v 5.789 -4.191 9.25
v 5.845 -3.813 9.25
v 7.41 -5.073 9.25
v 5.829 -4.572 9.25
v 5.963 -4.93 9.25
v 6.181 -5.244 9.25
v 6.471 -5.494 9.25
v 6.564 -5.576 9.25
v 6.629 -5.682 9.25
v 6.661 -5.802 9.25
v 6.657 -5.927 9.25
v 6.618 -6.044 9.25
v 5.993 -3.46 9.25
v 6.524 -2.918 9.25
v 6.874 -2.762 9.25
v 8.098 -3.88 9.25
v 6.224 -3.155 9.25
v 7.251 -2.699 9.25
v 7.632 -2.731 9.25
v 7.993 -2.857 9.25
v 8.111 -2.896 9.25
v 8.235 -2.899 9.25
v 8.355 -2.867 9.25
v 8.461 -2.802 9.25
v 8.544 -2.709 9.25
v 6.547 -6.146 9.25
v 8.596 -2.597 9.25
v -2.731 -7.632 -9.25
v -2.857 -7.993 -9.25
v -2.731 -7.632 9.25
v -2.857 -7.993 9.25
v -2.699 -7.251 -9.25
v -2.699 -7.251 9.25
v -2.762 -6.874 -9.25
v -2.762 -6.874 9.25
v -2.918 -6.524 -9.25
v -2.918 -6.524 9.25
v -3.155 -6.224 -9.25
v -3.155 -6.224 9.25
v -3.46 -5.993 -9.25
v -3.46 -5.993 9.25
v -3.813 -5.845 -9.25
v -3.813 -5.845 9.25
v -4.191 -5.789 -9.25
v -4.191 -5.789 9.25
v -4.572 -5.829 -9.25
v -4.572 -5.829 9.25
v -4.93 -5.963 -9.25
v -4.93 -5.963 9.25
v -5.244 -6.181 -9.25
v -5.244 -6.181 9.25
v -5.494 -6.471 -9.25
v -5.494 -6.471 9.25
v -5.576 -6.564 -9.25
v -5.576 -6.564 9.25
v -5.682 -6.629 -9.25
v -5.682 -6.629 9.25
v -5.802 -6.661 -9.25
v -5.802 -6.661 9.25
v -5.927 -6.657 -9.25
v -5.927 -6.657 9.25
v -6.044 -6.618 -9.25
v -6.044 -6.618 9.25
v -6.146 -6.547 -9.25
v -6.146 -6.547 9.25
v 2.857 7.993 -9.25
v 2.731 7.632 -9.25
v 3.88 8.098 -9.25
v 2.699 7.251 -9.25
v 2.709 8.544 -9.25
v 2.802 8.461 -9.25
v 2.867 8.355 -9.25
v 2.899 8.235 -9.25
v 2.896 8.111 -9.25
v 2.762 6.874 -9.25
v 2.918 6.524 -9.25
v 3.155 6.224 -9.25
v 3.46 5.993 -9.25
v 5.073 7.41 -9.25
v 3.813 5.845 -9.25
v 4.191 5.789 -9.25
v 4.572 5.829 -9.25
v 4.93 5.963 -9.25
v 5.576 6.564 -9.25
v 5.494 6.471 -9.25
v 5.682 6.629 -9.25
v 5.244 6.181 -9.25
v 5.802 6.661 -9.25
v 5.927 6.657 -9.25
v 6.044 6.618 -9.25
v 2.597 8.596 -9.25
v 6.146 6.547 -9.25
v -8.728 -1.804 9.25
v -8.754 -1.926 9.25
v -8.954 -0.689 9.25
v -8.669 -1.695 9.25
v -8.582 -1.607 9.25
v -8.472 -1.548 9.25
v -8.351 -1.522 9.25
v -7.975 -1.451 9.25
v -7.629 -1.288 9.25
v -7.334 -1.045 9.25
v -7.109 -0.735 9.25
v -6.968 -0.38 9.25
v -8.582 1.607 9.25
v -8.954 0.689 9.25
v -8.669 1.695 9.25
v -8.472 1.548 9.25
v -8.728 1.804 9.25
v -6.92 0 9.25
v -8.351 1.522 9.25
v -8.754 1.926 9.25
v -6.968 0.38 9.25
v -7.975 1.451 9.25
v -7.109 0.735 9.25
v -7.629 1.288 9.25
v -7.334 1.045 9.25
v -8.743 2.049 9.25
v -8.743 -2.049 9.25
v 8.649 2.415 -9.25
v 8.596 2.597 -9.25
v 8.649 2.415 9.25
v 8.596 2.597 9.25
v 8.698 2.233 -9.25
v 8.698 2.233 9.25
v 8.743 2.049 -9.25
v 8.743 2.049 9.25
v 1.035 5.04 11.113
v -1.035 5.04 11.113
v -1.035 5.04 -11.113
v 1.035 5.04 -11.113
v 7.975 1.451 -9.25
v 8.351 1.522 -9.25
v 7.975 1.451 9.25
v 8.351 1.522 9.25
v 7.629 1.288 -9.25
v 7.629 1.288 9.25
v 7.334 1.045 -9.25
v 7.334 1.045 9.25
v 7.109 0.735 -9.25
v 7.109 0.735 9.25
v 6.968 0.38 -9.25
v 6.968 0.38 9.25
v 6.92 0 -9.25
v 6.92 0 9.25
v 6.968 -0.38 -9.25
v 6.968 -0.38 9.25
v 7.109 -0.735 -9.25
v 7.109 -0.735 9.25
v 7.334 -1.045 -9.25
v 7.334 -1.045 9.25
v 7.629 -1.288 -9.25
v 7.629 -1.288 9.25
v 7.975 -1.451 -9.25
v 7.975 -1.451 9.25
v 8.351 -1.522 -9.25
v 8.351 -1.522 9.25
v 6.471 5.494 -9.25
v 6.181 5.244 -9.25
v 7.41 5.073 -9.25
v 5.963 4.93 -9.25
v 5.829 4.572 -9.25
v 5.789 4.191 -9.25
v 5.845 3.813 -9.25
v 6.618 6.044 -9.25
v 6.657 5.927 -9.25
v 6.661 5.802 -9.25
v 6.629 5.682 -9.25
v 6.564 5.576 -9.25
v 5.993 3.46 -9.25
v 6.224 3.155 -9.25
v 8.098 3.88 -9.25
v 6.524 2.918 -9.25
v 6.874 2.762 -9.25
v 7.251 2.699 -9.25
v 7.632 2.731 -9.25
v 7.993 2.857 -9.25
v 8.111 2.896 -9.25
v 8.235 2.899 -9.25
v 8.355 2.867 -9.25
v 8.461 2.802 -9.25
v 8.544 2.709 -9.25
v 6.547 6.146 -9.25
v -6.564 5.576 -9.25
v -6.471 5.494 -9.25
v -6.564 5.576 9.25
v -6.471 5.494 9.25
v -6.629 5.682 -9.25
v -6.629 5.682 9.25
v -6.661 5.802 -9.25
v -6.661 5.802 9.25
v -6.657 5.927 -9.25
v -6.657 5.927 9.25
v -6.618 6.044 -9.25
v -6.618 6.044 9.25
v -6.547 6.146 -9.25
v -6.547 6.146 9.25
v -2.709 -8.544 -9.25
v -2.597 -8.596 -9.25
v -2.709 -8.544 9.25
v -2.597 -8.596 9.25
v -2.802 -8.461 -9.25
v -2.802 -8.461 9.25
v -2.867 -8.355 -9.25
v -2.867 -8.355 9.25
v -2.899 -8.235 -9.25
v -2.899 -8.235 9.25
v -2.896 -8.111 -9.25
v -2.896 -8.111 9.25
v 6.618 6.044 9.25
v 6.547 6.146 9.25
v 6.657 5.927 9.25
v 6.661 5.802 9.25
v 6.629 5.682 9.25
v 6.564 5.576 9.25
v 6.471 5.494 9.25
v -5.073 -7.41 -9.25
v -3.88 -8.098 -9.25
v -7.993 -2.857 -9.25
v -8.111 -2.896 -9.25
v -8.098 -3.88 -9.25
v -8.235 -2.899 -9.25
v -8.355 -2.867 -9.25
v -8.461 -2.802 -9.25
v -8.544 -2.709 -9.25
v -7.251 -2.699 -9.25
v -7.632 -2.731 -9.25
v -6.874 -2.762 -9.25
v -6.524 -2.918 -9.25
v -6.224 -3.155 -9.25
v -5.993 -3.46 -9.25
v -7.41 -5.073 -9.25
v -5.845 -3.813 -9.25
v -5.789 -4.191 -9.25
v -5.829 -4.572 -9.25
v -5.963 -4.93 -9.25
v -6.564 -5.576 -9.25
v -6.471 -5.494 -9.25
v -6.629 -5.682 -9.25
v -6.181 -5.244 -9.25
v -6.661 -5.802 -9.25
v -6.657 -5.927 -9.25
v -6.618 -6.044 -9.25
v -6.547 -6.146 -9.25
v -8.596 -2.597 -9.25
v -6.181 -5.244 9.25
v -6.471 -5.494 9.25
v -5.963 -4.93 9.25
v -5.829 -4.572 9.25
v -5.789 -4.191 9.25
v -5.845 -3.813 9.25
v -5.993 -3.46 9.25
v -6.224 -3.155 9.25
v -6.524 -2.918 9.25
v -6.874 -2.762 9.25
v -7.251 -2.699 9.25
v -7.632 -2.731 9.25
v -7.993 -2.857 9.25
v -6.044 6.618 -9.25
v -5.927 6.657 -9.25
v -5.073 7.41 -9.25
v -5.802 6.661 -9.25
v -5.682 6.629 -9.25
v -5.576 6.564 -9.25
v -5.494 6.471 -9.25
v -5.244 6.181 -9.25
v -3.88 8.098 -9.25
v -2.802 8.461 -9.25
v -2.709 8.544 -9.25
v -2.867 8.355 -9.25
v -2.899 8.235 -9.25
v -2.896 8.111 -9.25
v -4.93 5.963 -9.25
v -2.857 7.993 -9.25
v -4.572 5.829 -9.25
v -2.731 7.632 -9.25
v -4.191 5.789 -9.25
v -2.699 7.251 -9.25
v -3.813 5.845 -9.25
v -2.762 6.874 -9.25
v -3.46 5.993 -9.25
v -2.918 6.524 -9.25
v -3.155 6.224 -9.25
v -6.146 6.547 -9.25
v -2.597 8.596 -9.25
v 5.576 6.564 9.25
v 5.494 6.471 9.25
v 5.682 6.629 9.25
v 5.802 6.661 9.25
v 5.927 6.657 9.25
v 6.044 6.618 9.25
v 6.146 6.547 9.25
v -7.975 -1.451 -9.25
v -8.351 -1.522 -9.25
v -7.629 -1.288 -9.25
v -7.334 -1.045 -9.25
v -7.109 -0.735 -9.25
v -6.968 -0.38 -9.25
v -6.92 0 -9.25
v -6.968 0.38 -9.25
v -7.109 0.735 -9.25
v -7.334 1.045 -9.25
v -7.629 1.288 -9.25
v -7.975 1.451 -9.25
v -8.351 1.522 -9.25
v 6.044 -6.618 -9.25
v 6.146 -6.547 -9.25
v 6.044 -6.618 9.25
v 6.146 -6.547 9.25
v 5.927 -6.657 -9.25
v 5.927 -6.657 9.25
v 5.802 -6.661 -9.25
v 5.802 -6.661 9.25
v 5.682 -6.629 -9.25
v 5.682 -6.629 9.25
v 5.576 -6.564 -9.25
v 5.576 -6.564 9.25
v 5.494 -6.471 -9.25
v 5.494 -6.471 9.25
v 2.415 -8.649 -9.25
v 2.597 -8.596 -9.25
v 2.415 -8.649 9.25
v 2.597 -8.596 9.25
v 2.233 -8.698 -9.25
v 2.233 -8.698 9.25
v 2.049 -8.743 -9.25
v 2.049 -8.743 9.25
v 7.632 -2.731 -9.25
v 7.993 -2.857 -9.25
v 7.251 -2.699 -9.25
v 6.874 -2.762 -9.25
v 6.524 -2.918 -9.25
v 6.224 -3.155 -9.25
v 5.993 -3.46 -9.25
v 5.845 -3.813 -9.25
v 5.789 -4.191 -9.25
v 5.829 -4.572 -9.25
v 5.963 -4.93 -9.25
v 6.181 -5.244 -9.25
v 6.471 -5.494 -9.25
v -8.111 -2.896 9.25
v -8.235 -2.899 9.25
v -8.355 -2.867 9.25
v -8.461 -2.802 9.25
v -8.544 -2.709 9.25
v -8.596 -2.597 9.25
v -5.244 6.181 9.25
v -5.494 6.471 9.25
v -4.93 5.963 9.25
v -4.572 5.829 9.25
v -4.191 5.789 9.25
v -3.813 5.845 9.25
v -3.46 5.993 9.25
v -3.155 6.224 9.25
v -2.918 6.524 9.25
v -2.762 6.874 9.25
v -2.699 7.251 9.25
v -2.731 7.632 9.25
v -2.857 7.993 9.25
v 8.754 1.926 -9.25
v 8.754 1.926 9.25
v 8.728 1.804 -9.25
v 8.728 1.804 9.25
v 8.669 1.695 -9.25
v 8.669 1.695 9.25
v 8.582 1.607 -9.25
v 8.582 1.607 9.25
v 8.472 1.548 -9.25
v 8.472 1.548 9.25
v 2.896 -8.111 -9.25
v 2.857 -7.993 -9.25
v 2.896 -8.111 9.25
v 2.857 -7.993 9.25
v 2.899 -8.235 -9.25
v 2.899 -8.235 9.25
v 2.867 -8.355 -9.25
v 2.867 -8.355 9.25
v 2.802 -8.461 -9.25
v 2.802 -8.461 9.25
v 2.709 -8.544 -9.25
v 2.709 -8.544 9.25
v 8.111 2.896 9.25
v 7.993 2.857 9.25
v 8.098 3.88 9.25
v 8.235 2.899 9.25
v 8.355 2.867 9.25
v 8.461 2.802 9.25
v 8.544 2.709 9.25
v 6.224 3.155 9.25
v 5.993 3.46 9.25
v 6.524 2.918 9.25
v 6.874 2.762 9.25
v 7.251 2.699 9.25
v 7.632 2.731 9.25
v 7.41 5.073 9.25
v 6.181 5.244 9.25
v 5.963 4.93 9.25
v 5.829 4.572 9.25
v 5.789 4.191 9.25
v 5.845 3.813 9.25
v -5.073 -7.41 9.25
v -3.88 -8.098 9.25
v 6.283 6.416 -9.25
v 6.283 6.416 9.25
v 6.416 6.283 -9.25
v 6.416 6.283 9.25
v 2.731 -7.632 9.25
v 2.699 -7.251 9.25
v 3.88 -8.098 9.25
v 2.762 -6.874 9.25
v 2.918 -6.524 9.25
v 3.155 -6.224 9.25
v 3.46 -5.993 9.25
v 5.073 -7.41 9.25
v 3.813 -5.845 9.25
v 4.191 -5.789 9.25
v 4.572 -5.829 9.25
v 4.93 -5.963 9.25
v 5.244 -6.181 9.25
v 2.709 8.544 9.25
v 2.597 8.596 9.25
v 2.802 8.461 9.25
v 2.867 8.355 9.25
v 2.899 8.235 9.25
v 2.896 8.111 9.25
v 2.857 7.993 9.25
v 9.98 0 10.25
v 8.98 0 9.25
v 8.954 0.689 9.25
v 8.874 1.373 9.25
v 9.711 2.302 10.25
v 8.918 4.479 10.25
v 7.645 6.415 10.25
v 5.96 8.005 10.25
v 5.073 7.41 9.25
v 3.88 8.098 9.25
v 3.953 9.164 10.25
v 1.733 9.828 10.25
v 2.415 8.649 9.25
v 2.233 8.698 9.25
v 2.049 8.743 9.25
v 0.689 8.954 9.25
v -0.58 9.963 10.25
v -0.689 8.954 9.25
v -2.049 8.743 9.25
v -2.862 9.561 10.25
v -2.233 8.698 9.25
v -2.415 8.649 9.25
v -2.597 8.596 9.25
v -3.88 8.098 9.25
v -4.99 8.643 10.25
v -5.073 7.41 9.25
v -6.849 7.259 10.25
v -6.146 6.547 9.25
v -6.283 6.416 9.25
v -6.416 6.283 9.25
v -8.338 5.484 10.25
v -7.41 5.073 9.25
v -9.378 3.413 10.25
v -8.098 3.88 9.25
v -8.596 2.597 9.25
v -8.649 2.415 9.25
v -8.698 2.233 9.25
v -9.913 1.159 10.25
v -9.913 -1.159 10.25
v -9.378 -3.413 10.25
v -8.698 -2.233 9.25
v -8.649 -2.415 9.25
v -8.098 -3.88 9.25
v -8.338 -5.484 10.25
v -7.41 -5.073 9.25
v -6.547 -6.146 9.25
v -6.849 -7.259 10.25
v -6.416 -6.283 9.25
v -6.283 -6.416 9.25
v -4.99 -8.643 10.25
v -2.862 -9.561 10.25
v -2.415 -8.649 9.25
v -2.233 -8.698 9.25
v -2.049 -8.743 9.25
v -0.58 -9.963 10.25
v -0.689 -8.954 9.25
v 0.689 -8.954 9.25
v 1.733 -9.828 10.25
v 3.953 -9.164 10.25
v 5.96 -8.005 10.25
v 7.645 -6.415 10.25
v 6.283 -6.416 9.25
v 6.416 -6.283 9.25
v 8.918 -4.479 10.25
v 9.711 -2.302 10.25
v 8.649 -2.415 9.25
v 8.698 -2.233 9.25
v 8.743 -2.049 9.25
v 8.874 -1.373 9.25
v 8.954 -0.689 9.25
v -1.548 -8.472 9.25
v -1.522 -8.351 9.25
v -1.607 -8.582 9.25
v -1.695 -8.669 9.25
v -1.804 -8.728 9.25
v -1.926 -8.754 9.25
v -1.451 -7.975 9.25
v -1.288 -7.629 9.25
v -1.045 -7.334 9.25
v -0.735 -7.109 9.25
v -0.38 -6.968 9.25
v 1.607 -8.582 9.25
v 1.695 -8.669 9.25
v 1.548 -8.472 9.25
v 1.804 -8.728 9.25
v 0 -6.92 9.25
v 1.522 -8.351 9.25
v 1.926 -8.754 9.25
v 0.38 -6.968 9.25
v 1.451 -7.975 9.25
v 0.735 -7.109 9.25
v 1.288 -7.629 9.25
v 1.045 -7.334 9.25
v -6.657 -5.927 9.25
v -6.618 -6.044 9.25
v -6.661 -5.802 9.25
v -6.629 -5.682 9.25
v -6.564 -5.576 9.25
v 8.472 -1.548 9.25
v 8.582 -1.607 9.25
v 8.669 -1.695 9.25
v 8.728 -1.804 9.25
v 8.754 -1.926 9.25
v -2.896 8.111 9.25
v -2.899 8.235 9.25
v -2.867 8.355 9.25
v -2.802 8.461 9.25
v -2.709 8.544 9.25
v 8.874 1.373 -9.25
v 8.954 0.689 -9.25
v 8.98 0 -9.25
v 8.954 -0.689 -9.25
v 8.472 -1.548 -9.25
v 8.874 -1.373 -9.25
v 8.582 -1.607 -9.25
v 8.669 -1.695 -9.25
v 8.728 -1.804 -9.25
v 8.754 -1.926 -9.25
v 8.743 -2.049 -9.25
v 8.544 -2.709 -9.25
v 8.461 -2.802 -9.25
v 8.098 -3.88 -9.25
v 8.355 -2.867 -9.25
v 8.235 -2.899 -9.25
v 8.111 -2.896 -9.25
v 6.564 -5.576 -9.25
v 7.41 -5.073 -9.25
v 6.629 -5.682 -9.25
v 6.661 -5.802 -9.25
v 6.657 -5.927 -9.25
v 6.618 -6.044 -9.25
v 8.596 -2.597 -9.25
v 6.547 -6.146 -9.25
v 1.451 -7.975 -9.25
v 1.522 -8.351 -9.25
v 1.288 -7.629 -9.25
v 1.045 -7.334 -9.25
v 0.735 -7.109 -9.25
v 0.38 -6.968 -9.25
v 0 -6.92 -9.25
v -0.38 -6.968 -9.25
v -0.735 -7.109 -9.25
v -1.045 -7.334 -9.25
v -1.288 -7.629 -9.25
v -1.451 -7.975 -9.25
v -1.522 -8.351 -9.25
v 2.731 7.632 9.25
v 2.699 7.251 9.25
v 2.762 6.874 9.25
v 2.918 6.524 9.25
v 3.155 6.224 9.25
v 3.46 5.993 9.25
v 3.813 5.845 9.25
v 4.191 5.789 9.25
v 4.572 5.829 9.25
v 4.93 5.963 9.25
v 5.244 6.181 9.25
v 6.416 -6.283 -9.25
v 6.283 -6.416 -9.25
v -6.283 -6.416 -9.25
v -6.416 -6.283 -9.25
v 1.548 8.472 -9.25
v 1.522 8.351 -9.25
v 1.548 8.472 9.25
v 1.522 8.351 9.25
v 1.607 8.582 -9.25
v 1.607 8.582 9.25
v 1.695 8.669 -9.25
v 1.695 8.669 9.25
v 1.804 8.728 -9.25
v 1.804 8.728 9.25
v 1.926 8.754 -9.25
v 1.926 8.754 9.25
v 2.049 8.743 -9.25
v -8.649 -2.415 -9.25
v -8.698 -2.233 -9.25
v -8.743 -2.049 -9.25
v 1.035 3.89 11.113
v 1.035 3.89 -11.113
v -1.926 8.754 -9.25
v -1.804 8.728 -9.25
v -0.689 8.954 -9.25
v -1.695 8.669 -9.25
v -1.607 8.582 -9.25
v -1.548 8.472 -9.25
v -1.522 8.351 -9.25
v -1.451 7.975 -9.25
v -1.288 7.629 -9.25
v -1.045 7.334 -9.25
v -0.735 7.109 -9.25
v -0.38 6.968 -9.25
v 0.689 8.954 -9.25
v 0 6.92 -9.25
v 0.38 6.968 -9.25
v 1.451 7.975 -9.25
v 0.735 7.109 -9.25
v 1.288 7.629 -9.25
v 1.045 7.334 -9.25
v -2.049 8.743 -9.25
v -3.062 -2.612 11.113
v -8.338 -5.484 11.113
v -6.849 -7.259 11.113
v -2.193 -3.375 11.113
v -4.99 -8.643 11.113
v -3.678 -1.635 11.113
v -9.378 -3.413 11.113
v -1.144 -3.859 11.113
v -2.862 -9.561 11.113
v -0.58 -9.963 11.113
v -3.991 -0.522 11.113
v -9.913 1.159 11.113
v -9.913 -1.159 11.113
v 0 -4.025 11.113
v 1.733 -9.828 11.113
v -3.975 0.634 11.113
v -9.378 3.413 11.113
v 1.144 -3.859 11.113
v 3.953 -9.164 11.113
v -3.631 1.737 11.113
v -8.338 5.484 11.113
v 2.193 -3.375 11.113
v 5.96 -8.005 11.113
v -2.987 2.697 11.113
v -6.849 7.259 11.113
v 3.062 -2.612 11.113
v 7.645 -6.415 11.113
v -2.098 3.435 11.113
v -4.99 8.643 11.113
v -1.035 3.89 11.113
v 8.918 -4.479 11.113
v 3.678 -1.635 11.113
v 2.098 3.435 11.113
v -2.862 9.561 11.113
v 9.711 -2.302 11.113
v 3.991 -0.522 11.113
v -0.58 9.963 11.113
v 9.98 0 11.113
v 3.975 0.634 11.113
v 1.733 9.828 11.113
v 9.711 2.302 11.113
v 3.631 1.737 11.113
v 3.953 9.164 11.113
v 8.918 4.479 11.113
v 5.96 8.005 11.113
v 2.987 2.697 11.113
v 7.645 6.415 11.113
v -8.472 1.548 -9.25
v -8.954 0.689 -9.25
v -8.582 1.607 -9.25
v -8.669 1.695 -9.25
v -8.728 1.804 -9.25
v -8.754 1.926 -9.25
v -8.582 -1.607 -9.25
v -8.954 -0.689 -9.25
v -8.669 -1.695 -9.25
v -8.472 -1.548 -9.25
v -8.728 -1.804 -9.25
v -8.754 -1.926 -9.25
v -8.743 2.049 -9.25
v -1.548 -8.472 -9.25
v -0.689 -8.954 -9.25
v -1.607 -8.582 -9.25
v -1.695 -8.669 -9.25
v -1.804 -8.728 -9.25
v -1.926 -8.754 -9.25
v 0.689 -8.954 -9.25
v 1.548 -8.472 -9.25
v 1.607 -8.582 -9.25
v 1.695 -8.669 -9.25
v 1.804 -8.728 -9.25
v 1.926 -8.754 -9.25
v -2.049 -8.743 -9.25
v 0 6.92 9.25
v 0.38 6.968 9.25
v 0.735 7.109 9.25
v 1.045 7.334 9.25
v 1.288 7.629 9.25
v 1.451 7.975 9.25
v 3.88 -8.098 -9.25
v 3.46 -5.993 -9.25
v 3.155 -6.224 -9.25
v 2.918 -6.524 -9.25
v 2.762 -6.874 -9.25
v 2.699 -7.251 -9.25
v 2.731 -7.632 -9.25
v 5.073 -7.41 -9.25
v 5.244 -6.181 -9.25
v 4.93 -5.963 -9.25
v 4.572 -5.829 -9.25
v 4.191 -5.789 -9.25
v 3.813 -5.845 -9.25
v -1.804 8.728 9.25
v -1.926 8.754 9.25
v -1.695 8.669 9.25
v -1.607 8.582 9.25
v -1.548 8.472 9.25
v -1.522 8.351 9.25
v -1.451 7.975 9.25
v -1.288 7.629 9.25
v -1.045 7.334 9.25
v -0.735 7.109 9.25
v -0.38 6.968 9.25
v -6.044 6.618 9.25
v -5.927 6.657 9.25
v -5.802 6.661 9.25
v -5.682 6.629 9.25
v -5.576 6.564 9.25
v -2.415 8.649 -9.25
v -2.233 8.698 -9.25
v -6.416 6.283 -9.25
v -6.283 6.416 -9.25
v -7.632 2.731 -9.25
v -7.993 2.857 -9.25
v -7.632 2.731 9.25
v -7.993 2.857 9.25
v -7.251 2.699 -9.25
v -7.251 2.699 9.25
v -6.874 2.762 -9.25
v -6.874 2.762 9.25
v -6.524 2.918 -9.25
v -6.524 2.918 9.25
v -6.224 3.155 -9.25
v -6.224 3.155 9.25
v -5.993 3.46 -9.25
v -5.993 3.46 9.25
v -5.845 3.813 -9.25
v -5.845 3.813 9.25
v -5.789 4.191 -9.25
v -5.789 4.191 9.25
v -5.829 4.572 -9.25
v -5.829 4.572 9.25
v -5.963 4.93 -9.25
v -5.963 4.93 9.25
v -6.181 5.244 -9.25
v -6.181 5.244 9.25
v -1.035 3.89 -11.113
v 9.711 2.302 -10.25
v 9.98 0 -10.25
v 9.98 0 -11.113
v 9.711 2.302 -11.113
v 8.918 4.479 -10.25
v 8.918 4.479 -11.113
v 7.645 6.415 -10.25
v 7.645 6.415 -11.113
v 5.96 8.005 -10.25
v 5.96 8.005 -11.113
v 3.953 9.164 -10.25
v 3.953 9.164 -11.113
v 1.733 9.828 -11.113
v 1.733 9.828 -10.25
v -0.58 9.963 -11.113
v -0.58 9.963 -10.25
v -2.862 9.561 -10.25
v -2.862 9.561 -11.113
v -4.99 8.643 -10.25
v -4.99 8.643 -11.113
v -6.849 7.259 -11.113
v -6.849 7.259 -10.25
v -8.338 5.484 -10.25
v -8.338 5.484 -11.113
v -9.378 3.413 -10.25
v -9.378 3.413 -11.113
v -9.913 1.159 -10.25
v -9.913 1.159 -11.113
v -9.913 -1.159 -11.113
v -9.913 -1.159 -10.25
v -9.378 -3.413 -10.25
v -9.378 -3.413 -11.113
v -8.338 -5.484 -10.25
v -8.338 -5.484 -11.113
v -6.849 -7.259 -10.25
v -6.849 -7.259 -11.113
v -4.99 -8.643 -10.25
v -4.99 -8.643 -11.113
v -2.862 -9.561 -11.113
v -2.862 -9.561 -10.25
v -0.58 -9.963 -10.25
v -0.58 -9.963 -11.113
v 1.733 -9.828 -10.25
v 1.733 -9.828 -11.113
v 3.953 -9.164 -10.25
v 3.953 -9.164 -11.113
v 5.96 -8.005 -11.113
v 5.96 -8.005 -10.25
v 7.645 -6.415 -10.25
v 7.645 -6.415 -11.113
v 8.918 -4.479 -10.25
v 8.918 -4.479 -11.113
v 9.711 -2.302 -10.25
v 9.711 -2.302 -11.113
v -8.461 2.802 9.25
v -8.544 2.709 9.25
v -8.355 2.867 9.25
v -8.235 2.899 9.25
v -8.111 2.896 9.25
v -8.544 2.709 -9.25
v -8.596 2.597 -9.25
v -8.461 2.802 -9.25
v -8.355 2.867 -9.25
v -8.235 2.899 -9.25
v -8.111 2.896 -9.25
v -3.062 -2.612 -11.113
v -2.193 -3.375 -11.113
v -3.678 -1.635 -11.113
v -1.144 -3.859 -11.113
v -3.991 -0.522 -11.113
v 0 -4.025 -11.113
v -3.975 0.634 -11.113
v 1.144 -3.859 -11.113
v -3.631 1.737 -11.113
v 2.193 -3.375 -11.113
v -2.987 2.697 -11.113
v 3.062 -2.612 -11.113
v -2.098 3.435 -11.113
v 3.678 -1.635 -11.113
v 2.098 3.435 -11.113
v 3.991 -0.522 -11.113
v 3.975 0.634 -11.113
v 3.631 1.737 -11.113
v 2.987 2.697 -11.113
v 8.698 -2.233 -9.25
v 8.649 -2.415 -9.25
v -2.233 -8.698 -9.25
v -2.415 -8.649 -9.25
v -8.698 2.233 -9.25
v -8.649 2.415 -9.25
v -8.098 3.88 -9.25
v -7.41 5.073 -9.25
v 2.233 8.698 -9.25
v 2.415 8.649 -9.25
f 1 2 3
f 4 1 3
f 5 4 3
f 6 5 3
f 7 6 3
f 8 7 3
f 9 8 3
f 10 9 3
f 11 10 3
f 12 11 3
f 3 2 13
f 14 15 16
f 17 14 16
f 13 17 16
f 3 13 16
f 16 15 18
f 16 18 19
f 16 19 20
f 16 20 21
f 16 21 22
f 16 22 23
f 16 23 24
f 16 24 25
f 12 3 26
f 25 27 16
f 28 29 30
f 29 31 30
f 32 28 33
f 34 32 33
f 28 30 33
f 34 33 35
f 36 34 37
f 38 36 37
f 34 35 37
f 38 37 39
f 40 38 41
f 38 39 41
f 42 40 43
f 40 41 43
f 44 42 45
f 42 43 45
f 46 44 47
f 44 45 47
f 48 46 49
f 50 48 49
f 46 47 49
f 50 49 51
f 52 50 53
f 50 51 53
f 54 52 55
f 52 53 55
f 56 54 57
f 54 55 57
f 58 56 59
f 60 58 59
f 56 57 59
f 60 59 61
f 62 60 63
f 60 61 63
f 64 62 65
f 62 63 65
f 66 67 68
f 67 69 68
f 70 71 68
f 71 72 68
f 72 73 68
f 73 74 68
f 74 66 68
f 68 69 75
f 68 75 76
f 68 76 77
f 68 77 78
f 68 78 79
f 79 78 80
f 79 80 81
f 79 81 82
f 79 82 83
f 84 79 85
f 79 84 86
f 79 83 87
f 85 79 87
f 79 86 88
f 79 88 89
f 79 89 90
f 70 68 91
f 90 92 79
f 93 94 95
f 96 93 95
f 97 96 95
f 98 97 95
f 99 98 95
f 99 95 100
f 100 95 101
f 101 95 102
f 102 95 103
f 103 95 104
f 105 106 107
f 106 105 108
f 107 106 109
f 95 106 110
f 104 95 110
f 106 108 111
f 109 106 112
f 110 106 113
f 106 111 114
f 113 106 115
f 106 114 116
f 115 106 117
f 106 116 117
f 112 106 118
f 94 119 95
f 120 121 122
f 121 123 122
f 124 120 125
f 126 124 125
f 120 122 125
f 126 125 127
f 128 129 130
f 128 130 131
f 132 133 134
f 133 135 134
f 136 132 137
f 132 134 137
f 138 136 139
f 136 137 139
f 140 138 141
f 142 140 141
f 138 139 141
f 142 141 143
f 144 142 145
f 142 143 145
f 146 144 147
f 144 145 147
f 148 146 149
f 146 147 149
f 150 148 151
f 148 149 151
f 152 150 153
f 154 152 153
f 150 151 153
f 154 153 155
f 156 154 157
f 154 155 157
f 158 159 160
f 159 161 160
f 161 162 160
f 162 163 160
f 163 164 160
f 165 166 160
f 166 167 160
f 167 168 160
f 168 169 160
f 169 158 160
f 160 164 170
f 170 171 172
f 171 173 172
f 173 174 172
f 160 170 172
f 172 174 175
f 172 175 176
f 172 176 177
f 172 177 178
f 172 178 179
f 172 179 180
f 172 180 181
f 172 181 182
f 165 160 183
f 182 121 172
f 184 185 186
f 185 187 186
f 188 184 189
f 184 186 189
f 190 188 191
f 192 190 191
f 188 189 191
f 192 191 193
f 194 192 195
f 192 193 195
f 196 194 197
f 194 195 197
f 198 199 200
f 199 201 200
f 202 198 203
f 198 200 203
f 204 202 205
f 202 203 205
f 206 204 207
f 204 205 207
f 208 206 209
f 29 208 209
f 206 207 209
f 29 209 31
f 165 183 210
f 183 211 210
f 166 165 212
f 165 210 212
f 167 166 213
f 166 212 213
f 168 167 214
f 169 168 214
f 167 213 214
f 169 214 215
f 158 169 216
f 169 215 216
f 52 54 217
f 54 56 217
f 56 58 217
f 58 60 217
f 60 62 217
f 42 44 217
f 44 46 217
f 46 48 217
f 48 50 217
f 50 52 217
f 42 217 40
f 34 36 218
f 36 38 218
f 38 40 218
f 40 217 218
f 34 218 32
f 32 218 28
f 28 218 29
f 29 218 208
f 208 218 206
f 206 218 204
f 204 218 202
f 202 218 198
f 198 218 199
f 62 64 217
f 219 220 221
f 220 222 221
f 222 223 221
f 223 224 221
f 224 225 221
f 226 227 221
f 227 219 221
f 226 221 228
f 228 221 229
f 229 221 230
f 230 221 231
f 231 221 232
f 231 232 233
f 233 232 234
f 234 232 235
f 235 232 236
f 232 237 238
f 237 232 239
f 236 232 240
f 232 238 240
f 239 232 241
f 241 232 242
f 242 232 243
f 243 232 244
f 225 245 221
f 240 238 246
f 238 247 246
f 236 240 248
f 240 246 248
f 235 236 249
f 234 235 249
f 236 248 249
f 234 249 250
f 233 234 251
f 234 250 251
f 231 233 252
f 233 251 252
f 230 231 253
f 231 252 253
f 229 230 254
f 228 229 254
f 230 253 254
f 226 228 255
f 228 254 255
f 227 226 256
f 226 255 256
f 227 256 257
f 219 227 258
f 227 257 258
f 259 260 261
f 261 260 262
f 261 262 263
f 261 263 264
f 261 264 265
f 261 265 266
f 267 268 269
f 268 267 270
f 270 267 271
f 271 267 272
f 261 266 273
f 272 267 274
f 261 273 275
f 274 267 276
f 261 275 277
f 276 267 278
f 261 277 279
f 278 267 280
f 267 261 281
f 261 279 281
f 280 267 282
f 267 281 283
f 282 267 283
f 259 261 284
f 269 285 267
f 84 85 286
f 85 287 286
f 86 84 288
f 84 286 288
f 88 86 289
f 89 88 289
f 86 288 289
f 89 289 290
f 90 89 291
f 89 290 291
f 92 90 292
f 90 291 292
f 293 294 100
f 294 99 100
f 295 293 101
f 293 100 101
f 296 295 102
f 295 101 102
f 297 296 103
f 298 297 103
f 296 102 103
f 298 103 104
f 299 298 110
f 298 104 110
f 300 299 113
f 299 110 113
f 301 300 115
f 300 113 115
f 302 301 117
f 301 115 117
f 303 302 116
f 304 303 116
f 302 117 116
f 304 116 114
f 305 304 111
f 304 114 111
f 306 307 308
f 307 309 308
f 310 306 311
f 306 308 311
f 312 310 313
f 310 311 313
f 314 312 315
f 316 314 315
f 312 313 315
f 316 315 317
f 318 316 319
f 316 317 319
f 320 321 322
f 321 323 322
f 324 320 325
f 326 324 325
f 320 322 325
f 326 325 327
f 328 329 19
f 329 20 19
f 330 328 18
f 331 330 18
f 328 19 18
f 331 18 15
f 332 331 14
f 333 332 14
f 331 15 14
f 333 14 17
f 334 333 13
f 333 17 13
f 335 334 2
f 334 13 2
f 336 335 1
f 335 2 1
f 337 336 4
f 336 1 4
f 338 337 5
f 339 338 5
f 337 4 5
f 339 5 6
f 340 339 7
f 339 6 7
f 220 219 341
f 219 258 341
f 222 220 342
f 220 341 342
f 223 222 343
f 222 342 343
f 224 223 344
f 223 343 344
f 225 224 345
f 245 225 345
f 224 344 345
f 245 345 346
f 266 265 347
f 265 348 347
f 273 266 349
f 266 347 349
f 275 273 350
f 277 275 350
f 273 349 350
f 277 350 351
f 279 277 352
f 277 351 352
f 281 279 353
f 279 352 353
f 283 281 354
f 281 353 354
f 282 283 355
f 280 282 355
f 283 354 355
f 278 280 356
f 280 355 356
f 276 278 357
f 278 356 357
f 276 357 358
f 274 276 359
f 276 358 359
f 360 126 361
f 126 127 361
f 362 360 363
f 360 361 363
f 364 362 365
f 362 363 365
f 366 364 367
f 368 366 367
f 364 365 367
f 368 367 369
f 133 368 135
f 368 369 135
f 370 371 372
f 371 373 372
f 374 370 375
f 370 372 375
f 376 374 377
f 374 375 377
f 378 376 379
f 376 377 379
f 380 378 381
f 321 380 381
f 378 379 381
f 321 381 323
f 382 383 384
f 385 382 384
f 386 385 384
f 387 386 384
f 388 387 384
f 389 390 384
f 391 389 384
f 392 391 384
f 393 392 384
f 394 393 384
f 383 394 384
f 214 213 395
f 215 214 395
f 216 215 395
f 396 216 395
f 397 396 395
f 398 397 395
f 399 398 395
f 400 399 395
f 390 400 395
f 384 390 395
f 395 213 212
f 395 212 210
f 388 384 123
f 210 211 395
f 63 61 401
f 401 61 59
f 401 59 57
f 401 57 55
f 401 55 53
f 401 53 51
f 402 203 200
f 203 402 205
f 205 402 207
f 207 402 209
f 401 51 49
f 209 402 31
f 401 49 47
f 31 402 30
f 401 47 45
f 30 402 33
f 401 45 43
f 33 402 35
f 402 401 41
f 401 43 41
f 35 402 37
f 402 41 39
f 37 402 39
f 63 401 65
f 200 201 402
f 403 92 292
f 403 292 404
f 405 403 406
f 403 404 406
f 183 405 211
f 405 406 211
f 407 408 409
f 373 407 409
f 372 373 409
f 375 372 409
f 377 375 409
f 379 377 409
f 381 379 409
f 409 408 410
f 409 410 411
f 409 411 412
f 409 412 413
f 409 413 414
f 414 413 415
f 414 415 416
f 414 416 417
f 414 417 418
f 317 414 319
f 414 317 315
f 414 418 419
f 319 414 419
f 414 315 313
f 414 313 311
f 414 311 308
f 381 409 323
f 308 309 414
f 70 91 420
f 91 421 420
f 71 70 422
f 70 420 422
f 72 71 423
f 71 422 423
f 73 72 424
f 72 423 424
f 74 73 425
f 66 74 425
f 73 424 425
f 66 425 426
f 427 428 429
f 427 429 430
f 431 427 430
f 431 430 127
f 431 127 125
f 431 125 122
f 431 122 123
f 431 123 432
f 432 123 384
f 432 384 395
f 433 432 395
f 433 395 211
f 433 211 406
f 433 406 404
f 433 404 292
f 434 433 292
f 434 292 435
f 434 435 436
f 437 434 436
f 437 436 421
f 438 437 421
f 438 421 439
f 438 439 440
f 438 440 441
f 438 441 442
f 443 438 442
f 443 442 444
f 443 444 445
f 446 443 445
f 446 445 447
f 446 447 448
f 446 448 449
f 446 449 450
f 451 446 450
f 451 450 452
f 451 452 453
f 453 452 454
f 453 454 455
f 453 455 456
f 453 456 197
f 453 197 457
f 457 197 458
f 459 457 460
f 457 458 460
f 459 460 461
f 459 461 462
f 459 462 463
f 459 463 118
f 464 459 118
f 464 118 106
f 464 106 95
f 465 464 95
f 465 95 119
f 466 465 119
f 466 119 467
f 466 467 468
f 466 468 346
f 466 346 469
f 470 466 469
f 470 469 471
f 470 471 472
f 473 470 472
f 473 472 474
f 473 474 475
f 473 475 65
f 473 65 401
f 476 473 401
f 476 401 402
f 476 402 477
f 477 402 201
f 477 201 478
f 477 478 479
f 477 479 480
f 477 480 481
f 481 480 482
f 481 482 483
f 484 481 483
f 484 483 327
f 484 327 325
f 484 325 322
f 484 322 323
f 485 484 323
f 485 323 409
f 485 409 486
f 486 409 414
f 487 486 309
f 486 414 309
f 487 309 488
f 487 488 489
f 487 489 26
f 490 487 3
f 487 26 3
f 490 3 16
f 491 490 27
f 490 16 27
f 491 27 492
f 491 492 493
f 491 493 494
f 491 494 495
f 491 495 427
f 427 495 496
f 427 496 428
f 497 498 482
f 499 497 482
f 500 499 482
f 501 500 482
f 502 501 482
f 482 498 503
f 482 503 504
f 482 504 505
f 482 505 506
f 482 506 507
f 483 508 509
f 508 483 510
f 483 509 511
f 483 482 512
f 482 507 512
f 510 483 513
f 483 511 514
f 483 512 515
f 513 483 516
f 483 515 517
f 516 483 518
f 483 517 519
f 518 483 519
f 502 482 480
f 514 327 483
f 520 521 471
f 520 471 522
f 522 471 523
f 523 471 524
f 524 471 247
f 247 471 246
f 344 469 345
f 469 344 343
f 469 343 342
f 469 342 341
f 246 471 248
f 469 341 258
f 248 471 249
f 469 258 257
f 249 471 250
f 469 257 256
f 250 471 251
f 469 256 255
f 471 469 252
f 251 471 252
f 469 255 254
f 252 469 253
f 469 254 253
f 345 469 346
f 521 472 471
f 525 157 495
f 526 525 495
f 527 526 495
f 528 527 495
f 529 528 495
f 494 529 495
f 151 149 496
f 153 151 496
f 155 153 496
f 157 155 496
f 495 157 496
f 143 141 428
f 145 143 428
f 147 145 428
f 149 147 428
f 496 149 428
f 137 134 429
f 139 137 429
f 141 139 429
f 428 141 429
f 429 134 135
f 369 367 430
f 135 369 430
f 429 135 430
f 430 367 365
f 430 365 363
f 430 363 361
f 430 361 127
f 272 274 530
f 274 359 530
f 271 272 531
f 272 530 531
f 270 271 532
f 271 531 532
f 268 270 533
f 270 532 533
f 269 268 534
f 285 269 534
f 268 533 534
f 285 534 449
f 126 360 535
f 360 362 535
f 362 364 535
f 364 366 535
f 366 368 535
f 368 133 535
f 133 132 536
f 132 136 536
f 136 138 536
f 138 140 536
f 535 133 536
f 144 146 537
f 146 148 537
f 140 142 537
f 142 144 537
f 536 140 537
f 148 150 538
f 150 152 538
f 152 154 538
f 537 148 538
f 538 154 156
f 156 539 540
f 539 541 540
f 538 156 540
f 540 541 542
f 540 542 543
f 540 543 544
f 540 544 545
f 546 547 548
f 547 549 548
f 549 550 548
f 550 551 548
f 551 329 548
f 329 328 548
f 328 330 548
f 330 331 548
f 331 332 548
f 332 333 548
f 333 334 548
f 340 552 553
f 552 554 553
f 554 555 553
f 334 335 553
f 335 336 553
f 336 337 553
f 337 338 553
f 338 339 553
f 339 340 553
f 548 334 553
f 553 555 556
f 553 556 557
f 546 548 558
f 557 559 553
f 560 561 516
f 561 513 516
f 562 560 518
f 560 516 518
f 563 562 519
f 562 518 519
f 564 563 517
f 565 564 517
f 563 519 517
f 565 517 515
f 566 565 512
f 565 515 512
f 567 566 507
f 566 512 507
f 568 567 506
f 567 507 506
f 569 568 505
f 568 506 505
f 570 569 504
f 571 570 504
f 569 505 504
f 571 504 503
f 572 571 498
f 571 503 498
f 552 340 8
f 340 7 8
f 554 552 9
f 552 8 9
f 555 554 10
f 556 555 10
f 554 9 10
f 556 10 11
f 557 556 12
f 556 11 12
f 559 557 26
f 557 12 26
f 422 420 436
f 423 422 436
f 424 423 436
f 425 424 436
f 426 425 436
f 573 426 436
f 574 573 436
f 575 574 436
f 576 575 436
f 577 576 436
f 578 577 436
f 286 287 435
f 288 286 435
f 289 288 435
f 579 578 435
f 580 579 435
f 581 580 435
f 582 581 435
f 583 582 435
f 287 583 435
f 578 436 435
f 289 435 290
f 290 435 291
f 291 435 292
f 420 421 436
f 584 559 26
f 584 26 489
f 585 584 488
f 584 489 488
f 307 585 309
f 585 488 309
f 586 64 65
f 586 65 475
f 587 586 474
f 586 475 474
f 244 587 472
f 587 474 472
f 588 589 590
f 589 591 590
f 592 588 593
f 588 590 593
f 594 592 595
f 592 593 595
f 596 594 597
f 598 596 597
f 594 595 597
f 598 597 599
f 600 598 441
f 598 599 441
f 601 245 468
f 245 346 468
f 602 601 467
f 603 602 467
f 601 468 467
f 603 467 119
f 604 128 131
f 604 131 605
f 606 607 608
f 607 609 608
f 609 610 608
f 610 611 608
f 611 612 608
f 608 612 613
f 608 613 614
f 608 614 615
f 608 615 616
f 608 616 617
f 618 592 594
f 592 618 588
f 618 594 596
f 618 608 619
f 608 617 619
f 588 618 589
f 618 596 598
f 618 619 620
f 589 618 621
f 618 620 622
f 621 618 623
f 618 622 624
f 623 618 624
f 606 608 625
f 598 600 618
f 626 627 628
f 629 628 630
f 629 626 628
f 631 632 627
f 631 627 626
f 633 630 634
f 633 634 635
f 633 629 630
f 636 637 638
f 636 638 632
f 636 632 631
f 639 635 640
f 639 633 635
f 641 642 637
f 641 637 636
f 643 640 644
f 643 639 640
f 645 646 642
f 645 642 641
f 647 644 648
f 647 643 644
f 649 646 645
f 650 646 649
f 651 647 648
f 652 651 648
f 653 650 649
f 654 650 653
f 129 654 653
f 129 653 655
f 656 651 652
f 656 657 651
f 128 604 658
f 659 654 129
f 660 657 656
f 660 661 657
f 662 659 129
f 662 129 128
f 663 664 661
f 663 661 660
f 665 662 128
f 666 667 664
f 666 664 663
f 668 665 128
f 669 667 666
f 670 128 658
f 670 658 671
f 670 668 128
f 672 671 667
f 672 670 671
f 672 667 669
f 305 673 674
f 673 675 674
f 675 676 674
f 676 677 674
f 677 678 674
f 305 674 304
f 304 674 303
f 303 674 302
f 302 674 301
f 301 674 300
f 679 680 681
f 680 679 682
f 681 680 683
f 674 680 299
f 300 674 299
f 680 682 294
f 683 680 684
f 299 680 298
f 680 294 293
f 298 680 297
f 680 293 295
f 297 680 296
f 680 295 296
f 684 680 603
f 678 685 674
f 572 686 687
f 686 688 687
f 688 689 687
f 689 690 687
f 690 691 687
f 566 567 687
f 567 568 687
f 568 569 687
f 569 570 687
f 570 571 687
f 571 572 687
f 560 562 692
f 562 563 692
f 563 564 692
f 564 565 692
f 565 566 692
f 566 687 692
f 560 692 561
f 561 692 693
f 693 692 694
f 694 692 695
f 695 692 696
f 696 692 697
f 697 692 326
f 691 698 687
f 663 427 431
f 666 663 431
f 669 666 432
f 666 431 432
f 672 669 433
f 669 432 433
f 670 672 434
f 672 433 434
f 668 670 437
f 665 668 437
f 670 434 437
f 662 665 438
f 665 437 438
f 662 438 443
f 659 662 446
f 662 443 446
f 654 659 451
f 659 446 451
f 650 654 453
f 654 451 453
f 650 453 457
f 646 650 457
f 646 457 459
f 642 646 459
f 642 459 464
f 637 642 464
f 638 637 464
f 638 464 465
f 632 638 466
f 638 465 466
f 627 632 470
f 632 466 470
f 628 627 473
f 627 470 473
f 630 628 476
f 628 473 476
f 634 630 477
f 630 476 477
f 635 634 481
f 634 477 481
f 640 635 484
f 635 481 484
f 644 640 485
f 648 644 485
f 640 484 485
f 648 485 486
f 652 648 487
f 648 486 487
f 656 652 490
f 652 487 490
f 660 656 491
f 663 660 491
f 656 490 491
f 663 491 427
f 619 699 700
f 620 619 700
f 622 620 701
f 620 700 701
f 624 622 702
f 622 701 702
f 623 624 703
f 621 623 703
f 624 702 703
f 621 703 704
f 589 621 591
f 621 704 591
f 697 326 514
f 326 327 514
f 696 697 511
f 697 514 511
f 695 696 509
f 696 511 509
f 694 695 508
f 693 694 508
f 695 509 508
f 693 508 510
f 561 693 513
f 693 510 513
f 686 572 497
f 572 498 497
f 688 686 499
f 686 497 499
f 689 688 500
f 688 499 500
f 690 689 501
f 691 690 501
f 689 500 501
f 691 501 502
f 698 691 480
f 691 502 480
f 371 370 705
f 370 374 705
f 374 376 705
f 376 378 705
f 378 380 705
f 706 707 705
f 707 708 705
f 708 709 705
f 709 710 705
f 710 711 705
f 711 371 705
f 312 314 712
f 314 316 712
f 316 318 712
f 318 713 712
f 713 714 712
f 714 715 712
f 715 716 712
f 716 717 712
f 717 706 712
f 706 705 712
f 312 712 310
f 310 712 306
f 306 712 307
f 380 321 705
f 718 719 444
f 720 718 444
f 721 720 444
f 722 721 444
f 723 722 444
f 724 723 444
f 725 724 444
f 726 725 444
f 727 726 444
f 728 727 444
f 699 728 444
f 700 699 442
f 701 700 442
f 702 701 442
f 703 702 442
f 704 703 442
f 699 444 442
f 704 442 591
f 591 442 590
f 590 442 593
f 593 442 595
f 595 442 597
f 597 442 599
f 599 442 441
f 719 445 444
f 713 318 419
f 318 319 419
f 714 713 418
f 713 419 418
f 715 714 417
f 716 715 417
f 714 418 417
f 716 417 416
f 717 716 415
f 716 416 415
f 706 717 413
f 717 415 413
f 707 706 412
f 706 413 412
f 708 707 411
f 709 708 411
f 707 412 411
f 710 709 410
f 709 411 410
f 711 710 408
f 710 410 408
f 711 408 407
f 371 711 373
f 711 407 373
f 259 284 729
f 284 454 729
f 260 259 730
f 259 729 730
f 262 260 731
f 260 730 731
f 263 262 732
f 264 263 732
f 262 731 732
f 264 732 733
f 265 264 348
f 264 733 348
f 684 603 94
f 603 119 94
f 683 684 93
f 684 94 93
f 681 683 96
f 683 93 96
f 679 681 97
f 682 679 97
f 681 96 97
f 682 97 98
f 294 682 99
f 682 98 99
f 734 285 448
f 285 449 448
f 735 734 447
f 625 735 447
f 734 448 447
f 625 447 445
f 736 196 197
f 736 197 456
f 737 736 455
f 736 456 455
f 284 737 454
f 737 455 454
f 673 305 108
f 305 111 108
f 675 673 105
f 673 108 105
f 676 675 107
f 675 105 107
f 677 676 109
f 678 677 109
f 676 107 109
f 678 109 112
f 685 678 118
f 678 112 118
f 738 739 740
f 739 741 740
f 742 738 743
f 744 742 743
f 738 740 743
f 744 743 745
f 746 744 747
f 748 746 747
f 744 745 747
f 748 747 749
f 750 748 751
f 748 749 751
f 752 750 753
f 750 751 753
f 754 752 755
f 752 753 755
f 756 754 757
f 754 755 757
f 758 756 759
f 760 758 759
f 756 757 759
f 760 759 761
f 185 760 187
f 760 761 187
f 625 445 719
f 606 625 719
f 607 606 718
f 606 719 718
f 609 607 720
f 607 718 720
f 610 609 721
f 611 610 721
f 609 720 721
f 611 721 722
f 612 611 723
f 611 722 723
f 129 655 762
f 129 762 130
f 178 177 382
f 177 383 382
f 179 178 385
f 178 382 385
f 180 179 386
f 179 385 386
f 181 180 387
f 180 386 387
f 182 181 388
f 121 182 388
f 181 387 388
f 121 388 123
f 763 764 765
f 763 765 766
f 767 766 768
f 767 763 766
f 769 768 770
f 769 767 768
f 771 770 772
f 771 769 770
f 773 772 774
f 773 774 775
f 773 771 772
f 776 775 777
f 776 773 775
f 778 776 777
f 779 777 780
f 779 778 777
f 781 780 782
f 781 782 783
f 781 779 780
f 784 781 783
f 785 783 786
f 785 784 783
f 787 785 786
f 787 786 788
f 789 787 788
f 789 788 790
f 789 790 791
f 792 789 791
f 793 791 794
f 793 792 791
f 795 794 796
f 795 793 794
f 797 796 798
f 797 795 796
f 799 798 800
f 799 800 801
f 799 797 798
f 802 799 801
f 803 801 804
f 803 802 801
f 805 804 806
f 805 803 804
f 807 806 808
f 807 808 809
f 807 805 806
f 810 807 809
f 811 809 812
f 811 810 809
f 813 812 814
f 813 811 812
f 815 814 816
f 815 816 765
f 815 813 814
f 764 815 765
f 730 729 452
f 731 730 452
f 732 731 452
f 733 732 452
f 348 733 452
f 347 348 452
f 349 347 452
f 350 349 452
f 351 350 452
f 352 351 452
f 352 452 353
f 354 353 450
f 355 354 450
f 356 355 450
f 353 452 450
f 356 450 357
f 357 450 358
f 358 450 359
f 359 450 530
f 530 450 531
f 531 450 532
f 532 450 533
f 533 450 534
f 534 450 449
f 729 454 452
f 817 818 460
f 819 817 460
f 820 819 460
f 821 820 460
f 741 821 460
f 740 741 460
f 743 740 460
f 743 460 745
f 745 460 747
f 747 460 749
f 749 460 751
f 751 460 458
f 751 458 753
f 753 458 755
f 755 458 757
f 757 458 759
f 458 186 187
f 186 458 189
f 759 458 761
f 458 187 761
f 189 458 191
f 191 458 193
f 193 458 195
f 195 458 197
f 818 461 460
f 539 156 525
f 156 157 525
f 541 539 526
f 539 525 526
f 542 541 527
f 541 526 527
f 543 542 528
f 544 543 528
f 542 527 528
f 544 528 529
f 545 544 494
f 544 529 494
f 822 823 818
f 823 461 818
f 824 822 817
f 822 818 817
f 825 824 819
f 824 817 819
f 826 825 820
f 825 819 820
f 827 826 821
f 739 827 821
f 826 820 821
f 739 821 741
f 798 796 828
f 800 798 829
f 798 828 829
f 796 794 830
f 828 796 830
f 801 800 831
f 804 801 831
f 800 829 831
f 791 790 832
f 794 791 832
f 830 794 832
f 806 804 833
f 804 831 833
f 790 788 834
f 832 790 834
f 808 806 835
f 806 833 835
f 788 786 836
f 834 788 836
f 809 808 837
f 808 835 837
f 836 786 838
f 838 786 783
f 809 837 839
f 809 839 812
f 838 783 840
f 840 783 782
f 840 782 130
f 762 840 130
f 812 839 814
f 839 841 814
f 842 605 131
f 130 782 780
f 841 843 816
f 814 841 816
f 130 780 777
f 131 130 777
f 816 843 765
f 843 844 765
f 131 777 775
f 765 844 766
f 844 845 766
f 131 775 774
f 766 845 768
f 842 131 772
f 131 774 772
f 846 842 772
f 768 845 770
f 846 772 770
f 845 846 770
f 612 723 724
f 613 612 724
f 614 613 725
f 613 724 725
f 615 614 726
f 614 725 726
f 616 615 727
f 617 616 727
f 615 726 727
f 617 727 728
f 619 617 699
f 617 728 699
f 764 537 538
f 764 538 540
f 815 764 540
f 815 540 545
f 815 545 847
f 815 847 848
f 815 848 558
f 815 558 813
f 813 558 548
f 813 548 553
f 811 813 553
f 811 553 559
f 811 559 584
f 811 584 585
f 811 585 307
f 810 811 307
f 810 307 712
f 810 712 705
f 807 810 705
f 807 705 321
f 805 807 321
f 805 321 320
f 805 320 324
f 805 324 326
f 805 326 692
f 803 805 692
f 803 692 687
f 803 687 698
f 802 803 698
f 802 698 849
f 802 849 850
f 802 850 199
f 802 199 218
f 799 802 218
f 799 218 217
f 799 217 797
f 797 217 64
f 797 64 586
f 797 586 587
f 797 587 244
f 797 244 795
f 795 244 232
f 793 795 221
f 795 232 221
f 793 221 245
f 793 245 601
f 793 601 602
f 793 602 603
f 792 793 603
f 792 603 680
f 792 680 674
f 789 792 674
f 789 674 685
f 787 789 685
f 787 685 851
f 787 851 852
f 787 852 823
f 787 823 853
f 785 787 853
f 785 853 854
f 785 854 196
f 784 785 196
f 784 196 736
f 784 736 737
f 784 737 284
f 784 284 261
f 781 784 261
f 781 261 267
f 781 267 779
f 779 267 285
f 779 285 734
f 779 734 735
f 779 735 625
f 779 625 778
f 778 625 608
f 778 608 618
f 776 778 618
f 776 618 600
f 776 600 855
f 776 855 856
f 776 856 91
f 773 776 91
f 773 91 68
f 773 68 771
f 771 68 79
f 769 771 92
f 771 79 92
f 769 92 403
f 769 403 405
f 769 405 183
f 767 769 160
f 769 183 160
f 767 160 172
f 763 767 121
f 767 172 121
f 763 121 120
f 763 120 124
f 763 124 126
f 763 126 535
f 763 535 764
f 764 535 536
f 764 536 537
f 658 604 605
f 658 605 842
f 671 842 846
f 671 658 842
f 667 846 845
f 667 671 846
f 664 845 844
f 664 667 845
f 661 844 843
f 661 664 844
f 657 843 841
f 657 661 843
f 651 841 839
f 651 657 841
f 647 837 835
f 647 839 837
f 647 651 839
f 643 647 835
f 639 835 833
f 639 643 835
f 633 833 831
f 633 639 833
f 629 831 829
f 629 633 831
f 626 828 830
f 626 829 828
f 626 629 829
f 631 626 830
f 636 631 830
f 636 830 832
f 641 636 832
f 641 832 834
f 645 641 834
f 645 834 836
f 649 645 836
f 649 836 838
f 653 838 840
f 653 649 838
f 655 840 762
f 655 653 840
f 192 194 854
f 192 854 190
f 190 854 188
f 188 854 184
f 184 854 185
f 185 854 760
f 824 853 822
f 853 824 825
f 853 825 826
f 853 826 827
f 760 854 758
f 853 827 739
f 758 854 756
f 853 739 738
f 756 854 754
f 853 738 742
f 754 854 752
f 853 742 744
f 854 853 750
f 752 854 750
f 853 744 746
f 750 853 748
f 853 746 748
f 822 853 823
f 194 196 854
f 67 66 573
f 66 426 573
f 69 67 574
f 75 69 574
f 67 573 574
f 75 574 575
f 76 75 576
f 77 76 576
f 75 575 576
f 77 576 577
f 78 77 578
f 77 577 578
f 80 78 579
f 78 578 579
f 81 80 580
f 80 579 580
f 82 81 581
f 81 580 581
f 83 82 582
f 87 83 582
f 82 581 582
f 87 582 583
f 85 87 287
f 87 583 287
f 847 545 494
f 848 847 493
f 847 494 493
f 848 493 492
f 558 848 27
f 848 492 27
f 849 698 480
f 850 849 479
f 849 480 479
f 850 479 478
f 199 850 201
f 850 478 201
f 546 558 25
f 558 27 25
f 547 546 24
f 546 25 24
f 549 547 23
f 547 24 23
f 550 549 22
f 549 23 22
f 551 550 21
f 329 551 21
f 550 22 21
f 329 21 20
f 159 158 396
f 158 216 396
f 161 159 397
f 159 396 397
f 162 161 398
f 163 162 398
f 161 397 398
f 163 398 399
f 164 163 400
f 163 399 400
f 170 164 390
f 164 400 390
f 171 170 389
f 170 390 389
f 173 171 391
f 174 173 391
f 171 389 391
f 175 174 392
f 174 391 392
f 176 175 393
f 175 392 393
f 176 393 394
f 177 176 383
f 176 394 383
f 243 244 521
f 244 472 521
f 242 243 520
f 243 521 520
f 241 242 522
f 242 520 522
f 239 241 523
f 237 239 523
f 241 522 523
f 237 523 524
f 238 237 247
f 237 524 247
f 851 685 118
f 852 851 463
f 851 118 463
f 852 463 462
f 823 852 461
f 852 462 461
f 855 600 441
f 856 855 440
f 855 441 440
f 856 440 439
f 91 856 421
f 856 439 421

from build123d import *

# Parameters (mm, degrees)
SALIENTE_EXTRUIR1_DEPTH   = 9.25
CROQUIS5_R                = 8.98
SALIENTE_EXTRUIR2_DEPTH   = 1
SALIENTE_EXTRUIR2_DRAFT   = -45
CROQUIS8_R                = 9.98
SALIENTE_EXTRUIR3_DEPTH   = 0.86250003
SIMETR_A1_COPY_1_SKETCH_R = 8.98
SIMETR_A1_COPY_1_DEPTH    = 1
SIMETR_A1_COPY_1_DRAFT    = -45
CORTAR_EXTRUIR1_DEPTH     = 27.327769136


with BuildPart() as part:
    # Croquis3 → Saliente-Extruir1 (new, symmetric)
    with BuildSketch(Plane.XY):
        with BuildLine():
            ThreePointArc((0, 6.92), (1.044537818, 7.333889859), (1.522093853, 8.350897382))
            ThreePointArc((1.522093853, 8.350897382), (1.69468698, 8.669418435), (2.049408684, 8.74301573))
            ThreePointArc((2.049408684, 8.74301573), (2.324195025, 8.67401392), (2.596667882, 8.596378069))
            ThreePointArc((2.596667882, 8.596378069), (2.867067241, 8.355280091), (2.857276747, 7.993136203))
            ThreePointArc((2.857276747, 7.993136203), (2.762348644, 6.873603835), (3.46, 5.992895794))
            ThreePointArc((3.46, 5.992895794), (4.571541215, 5.829066017), (5.493620634, 6.47104235))
            ThreePointArc((5.493620634, 6.47104235), (5.802351194, 6.660593111), (6.146347848, 6.546969386))
            ThreePointArc((6.146347848, 6.546969386), (6.349818895, 6.349818895), (6.546969386, 6.146347848))
            ThreePointArc((6.546969386, 6.146347848), (6.660593111, 5.802351194), (6.47104235, 5.493620634))
            ThreePointArc((6.47104235, 5.493620634), (5.829066017, 4.571541215), (5.992895794, 3.46))
            ThreePointArc((5.992895794, 3.46), (6.873603835, 2.762348644), (7.993136203, 2.857276747))
            ThreePointArc((7.993136203, 2.857276747), (8.355280091, 2.867067241), (8.596378069, 2.596667882))
            ThreePointArc((8.596378069, 2.596667882), (8.67401392, 2.324195025), (8.74301573, 2.049408684))
            ThreePointArc((8.74301573, 2.049408684), (8.669418435, 1.69468698), (8.350897382, 1.522093853))
            ThreePointArc((8.350897382, 1.522093853), (7.333889859, 1.044537818), (6.92, 0))
            ThreePointArc((6.92, 0), (7.333889859, -1.044537818), (8.350897382, -1.522093853))
            ThreePointArc((8.350897382, -1.522093853), (8.669418435, -1.69468698), (8.74301573, -2.049408684))
            ThreePointArc((8.74301573, -2.049408684), (8.67401392, -2.324195025), (8.596378069, -2.596667882))
            ThreePointArc((8.596378069, -2.596667882), (8.355280091, -2.867067241), (7.993136203, -2.857276747))
            ThreePointArc((7.993136203, -2.857276747), (6.873603835, -2.762348644), (5.992895794, -3.46))
            ThreePointArc((5.992895794, -3.46), (5.829066017, -4.571541215), (6.47104235, -5.493620634))
            ThreePointArc((6.47104235, -5.493620634), (6.660593111, -5.802351194), (6.546969386, -6.146347848))
            ThreePointArc((6.546969386, -6.146347848), (6.349818895, -6.349818895), (6.146347848, -6.546969386))
            ThreePointArc((6.146347848, -6.546969386), (5.802351194, -6.660593111), (5.493620634, -6.47104235))
            ThreePointArc((5.493620634, -6.47104235), (4.571541215, -5.829066017), (3.46, -5.992895794))
            ThreePointArc((3.46, -5.992895794), (2.762348644, -6.873603835), (2.857276747, -7.993136203))
            ThreePointArc((2.857276747, -7.993136203), (2.867067241, -8.355280091), (2.596667882, -8.596378069))
            ThreePointArc((2.596667882, -8.596378069), (2.324195025, -8.67401392), (2.049408684, -8.74301573))
            ThreePointArc((2.049408684, -8.74301573), (1.69468698, -8.669418435), (1.522093853, -8.350897382))
            ThreePointArc((1.522093853, -8.350897382), (1.044537818, -7.333889859), (0, -6.92))
            ThreePointArc((0, -6.92), (-1.044537818, -7.333889859), (-1.522093853, -8.350897382))
            ThreePointArc((-1.522093853, -8.350897382), (-1.69468698, -8.669418435), (-2.049408684, -8.74301573))
            ThreePointArc((-2.049408684, -8.74301573), (-2.324195025, -8.67401392), (-2.596667882, -8.596378069))
            ThreePointArc((-2.596667882, -8.596378069), (-2.867067241, -8.355280091), (-2.857276747, -7.993136203))
            ThreePointArc((-2.857276747, -7.993136203), (-2.762348644, -6.873603835), (-3.46, -5.992895794))
            ThreePointArc((-3.46, -5.992895794), (-4.571541215, -5.829066017), (-5.493620634, -6.47104235))
            ThreePointArc((-5.493620634, -6.47104235), (-5.802351194, -6.660593111), (-6.146347848, -6.546969386))
            ThreePointArc((-6.146347848, -6.546969386), (-6.349818895, -6.349818895), (-6.546969386, -6.146347848))
            ThreePointArc((-6.546969386, -6.146347848), (-6.660593111, -5.802351194), (-6.47104235, -5.493620634))
            ThreePointArc((-6.47104235, -5.493620634), (-5.829066017, -4.571541215), (-5.992895794, -3.46))
            ThreePointArc((-5.992895794, -3.46), (-6.873603835, -2.762348644), (-7.993136203, -2.857276747))
            ThreePointArc((-7.993136203, -2.857276747), (-8.355280091, -2.867067241), (-8.596378069, -2.596667882))
            ThreePointArc((-8.596378069, -2.596667882), (-8.67401392, -2.324195025), (-8.74301573, -2.049408684))
            ThreePointArc((-8.74301573, -2.049408684), (-8.669418435, -1.69468698), (-8.350897382, -1.522093853))
            ThreePointArc((-8.350897382, -1.522093853), (-7.333889859, -1.044537818), (-6.92, 0))
            ThreePointArc((-6.92, 0), (-7.333889859, 1.044537818), (-8.350897382, 1.522093853))
            ThreePointArc((-8.350897382, 1.522093853), (-8.669418435, 1.69468698), (-8.74301573, 2.049408684))
            ThreePointArc((-8.74301573, 2.049408684), (-8.67401392, 2.324195025), (-8.596378069, 2.596667882))
            ThreePointArc((-8.596378069, 2.596667882), (-8.355280091, 2.867067241), (-7.993136203, 2.857276747))
            ThreePointArc((-7.993136203, 2.857276747), (-6.873603835, 2.762348644), (-5.992895794, 3.46))
            ThreePointArc((-5.992895794, 3.46), (-5.829066017, 4.571541215), (-6.47104235, 5.493620634))
            ThreePointArc((-6.47104235, 5.493620634), (-6.660593111, 5.802351194), (-6.546969386, 6.146347848))
            ThreePointArc((-6.546969386, 6.146347848), (-6.349818895, 6.349818895), (-6.146347848, 6.546969386))
            ThreePointArc((-6.146347848, 6.546969386), (-5.802351194, 6.660593111), (-5.493620634, 6.47104235))
            ThreePointArc((-5.493620634, 6.47104235), (-4.571541215, 5.829066017), (-3.46, 5.992895794))
            ThreePointArc((-3.46, 5.992895794), (-2.762348644, 6.873603835), (-2.857276747, 7.993136203))
            ThreePointArc((-2.857276747, 7.993136203), (-2.867067241, 8.355280091), (-2.596667882, 8.596378069))
            ThreePointArc((-2.596667882, 8.596378069), (-2.324195025, 8.67401392), (-2.049408684, 8.74301573))
            ThreePointArc((-2.049408684, 8.74301573), (-1.69468698, 8.669418435), (-1.522093853, 8.350897382))
            ThreePointArc((-1.522093853, 8.350897382), (-1.044537818, 7.333889859), (0, 6.92))
        make_face()
    extrude(amount=SALIENTE_EXTRUIR1_DEPTH, both=True)


with BuildPart() as saliente_extruir2_tool:
    # Croquis5 → Saliente-Extruir2 (with draft: the straight prism first)
    with BuildSketch(Plane.XY.offset(9.25)):
        Circle(CROQUIS5_R)
    extrude(amount=SALIENTE_EXTRUIR2_DEPTH)
    # Saliente-Extruir2: the draft: its side faces are tilted about the plane it starts from
    saliente_extruir2_sides = [saliente_extruir2_tool.faces().sort_by_distance(p)[0] for p in [
        (-8.98, 0, 9.75),
    ]]
    draft(saliente_extruir2_sides, Plane.XY.offset(9.25), SALIENTE_EXTRUIR2_DRAFT)


with BuildPart() as part_1:
    add(part.part)

    # Saliente-Extruir2: add saliente_extruir2_tool
    add(saliente_extruir2_tool.part)

    # Croquis8 → Saliente-Extruir3 (add)
    with BuildSketch(Plane.XY.offset(10.25)):
        Circle(CROQUIS8_R)
    saliente_extruir3 = extrude(amount=SALIENTE_EXTRUIR3_DEPTH)


with BuildPart() as simetr_a1_1:
    # Simetría1: Saliente-Extruir3 across plane
    add(saliente_extruir3.mirror(Plane.XY))


with BuildPart() as simetr_a1_copy_1_tool:
    # Simetría1 copy 1 sketch → Simetría1 copy 1 (with draft: the straight prism first)
    with BuildSketch(Plane(origin=(0, 0, -9.25), x_dir=(1, 0, 0), z_dir=(0, 0, -1))):
        Circle(SIMETR_A1_COPY_1_SKETCH_R)
    extrude(amount=SIMETR_A1_COPY_1_DEPTH)
    # Simetría1 copy 1: the draft: its side faces are tilted about the plane it starts from
    simetr_a1_copy_1_sides = [simetr_a1_copy_1_tool.faces().sort_by_distance(p)[0] for p in [
        (-8.98, 0, -9.75),
    ]]
    draft(simetr_a1_copy_1_sides, Plane(origin=(0, 0, -9.25), x_dir=(1, 0, 0), z_dir=(0, 0, -1)), SIMETR_A1_COPY_1_DRAFT)


with BuildPart() as part_2:
    add(part_1.part)

    # Simetría1 copy 1: add simetr_a1_copy_1_tool
    add(simetr_a1_copy_1_tool.part)

    add(simetr_a1_1.part)  # Simetría1 copy 1 merges Simetría1_1

    # Croquis6 → Cortar-Extruir1 (cut, through all)
    with BuildSketch(Plane.XY.offset(11.11250003)):
        with BuildLine():
            Line((-1.035, 3.889652941), (-1.035, 5.04))
            Line((-1.035, 5.04), (1.035, 5.04))
            Line((1.035, 5.04), (1.035, 3.889652941))
            ThreePointArc((1.035, 3.889652941), (0, -4.025), (-1.035, 3.889652941))
        make_face()
    extrude(amount=-CORTAR_EXTRUIR1_DEPTH, mode=Mode.SUBTRACT)


solid = part_2.part
